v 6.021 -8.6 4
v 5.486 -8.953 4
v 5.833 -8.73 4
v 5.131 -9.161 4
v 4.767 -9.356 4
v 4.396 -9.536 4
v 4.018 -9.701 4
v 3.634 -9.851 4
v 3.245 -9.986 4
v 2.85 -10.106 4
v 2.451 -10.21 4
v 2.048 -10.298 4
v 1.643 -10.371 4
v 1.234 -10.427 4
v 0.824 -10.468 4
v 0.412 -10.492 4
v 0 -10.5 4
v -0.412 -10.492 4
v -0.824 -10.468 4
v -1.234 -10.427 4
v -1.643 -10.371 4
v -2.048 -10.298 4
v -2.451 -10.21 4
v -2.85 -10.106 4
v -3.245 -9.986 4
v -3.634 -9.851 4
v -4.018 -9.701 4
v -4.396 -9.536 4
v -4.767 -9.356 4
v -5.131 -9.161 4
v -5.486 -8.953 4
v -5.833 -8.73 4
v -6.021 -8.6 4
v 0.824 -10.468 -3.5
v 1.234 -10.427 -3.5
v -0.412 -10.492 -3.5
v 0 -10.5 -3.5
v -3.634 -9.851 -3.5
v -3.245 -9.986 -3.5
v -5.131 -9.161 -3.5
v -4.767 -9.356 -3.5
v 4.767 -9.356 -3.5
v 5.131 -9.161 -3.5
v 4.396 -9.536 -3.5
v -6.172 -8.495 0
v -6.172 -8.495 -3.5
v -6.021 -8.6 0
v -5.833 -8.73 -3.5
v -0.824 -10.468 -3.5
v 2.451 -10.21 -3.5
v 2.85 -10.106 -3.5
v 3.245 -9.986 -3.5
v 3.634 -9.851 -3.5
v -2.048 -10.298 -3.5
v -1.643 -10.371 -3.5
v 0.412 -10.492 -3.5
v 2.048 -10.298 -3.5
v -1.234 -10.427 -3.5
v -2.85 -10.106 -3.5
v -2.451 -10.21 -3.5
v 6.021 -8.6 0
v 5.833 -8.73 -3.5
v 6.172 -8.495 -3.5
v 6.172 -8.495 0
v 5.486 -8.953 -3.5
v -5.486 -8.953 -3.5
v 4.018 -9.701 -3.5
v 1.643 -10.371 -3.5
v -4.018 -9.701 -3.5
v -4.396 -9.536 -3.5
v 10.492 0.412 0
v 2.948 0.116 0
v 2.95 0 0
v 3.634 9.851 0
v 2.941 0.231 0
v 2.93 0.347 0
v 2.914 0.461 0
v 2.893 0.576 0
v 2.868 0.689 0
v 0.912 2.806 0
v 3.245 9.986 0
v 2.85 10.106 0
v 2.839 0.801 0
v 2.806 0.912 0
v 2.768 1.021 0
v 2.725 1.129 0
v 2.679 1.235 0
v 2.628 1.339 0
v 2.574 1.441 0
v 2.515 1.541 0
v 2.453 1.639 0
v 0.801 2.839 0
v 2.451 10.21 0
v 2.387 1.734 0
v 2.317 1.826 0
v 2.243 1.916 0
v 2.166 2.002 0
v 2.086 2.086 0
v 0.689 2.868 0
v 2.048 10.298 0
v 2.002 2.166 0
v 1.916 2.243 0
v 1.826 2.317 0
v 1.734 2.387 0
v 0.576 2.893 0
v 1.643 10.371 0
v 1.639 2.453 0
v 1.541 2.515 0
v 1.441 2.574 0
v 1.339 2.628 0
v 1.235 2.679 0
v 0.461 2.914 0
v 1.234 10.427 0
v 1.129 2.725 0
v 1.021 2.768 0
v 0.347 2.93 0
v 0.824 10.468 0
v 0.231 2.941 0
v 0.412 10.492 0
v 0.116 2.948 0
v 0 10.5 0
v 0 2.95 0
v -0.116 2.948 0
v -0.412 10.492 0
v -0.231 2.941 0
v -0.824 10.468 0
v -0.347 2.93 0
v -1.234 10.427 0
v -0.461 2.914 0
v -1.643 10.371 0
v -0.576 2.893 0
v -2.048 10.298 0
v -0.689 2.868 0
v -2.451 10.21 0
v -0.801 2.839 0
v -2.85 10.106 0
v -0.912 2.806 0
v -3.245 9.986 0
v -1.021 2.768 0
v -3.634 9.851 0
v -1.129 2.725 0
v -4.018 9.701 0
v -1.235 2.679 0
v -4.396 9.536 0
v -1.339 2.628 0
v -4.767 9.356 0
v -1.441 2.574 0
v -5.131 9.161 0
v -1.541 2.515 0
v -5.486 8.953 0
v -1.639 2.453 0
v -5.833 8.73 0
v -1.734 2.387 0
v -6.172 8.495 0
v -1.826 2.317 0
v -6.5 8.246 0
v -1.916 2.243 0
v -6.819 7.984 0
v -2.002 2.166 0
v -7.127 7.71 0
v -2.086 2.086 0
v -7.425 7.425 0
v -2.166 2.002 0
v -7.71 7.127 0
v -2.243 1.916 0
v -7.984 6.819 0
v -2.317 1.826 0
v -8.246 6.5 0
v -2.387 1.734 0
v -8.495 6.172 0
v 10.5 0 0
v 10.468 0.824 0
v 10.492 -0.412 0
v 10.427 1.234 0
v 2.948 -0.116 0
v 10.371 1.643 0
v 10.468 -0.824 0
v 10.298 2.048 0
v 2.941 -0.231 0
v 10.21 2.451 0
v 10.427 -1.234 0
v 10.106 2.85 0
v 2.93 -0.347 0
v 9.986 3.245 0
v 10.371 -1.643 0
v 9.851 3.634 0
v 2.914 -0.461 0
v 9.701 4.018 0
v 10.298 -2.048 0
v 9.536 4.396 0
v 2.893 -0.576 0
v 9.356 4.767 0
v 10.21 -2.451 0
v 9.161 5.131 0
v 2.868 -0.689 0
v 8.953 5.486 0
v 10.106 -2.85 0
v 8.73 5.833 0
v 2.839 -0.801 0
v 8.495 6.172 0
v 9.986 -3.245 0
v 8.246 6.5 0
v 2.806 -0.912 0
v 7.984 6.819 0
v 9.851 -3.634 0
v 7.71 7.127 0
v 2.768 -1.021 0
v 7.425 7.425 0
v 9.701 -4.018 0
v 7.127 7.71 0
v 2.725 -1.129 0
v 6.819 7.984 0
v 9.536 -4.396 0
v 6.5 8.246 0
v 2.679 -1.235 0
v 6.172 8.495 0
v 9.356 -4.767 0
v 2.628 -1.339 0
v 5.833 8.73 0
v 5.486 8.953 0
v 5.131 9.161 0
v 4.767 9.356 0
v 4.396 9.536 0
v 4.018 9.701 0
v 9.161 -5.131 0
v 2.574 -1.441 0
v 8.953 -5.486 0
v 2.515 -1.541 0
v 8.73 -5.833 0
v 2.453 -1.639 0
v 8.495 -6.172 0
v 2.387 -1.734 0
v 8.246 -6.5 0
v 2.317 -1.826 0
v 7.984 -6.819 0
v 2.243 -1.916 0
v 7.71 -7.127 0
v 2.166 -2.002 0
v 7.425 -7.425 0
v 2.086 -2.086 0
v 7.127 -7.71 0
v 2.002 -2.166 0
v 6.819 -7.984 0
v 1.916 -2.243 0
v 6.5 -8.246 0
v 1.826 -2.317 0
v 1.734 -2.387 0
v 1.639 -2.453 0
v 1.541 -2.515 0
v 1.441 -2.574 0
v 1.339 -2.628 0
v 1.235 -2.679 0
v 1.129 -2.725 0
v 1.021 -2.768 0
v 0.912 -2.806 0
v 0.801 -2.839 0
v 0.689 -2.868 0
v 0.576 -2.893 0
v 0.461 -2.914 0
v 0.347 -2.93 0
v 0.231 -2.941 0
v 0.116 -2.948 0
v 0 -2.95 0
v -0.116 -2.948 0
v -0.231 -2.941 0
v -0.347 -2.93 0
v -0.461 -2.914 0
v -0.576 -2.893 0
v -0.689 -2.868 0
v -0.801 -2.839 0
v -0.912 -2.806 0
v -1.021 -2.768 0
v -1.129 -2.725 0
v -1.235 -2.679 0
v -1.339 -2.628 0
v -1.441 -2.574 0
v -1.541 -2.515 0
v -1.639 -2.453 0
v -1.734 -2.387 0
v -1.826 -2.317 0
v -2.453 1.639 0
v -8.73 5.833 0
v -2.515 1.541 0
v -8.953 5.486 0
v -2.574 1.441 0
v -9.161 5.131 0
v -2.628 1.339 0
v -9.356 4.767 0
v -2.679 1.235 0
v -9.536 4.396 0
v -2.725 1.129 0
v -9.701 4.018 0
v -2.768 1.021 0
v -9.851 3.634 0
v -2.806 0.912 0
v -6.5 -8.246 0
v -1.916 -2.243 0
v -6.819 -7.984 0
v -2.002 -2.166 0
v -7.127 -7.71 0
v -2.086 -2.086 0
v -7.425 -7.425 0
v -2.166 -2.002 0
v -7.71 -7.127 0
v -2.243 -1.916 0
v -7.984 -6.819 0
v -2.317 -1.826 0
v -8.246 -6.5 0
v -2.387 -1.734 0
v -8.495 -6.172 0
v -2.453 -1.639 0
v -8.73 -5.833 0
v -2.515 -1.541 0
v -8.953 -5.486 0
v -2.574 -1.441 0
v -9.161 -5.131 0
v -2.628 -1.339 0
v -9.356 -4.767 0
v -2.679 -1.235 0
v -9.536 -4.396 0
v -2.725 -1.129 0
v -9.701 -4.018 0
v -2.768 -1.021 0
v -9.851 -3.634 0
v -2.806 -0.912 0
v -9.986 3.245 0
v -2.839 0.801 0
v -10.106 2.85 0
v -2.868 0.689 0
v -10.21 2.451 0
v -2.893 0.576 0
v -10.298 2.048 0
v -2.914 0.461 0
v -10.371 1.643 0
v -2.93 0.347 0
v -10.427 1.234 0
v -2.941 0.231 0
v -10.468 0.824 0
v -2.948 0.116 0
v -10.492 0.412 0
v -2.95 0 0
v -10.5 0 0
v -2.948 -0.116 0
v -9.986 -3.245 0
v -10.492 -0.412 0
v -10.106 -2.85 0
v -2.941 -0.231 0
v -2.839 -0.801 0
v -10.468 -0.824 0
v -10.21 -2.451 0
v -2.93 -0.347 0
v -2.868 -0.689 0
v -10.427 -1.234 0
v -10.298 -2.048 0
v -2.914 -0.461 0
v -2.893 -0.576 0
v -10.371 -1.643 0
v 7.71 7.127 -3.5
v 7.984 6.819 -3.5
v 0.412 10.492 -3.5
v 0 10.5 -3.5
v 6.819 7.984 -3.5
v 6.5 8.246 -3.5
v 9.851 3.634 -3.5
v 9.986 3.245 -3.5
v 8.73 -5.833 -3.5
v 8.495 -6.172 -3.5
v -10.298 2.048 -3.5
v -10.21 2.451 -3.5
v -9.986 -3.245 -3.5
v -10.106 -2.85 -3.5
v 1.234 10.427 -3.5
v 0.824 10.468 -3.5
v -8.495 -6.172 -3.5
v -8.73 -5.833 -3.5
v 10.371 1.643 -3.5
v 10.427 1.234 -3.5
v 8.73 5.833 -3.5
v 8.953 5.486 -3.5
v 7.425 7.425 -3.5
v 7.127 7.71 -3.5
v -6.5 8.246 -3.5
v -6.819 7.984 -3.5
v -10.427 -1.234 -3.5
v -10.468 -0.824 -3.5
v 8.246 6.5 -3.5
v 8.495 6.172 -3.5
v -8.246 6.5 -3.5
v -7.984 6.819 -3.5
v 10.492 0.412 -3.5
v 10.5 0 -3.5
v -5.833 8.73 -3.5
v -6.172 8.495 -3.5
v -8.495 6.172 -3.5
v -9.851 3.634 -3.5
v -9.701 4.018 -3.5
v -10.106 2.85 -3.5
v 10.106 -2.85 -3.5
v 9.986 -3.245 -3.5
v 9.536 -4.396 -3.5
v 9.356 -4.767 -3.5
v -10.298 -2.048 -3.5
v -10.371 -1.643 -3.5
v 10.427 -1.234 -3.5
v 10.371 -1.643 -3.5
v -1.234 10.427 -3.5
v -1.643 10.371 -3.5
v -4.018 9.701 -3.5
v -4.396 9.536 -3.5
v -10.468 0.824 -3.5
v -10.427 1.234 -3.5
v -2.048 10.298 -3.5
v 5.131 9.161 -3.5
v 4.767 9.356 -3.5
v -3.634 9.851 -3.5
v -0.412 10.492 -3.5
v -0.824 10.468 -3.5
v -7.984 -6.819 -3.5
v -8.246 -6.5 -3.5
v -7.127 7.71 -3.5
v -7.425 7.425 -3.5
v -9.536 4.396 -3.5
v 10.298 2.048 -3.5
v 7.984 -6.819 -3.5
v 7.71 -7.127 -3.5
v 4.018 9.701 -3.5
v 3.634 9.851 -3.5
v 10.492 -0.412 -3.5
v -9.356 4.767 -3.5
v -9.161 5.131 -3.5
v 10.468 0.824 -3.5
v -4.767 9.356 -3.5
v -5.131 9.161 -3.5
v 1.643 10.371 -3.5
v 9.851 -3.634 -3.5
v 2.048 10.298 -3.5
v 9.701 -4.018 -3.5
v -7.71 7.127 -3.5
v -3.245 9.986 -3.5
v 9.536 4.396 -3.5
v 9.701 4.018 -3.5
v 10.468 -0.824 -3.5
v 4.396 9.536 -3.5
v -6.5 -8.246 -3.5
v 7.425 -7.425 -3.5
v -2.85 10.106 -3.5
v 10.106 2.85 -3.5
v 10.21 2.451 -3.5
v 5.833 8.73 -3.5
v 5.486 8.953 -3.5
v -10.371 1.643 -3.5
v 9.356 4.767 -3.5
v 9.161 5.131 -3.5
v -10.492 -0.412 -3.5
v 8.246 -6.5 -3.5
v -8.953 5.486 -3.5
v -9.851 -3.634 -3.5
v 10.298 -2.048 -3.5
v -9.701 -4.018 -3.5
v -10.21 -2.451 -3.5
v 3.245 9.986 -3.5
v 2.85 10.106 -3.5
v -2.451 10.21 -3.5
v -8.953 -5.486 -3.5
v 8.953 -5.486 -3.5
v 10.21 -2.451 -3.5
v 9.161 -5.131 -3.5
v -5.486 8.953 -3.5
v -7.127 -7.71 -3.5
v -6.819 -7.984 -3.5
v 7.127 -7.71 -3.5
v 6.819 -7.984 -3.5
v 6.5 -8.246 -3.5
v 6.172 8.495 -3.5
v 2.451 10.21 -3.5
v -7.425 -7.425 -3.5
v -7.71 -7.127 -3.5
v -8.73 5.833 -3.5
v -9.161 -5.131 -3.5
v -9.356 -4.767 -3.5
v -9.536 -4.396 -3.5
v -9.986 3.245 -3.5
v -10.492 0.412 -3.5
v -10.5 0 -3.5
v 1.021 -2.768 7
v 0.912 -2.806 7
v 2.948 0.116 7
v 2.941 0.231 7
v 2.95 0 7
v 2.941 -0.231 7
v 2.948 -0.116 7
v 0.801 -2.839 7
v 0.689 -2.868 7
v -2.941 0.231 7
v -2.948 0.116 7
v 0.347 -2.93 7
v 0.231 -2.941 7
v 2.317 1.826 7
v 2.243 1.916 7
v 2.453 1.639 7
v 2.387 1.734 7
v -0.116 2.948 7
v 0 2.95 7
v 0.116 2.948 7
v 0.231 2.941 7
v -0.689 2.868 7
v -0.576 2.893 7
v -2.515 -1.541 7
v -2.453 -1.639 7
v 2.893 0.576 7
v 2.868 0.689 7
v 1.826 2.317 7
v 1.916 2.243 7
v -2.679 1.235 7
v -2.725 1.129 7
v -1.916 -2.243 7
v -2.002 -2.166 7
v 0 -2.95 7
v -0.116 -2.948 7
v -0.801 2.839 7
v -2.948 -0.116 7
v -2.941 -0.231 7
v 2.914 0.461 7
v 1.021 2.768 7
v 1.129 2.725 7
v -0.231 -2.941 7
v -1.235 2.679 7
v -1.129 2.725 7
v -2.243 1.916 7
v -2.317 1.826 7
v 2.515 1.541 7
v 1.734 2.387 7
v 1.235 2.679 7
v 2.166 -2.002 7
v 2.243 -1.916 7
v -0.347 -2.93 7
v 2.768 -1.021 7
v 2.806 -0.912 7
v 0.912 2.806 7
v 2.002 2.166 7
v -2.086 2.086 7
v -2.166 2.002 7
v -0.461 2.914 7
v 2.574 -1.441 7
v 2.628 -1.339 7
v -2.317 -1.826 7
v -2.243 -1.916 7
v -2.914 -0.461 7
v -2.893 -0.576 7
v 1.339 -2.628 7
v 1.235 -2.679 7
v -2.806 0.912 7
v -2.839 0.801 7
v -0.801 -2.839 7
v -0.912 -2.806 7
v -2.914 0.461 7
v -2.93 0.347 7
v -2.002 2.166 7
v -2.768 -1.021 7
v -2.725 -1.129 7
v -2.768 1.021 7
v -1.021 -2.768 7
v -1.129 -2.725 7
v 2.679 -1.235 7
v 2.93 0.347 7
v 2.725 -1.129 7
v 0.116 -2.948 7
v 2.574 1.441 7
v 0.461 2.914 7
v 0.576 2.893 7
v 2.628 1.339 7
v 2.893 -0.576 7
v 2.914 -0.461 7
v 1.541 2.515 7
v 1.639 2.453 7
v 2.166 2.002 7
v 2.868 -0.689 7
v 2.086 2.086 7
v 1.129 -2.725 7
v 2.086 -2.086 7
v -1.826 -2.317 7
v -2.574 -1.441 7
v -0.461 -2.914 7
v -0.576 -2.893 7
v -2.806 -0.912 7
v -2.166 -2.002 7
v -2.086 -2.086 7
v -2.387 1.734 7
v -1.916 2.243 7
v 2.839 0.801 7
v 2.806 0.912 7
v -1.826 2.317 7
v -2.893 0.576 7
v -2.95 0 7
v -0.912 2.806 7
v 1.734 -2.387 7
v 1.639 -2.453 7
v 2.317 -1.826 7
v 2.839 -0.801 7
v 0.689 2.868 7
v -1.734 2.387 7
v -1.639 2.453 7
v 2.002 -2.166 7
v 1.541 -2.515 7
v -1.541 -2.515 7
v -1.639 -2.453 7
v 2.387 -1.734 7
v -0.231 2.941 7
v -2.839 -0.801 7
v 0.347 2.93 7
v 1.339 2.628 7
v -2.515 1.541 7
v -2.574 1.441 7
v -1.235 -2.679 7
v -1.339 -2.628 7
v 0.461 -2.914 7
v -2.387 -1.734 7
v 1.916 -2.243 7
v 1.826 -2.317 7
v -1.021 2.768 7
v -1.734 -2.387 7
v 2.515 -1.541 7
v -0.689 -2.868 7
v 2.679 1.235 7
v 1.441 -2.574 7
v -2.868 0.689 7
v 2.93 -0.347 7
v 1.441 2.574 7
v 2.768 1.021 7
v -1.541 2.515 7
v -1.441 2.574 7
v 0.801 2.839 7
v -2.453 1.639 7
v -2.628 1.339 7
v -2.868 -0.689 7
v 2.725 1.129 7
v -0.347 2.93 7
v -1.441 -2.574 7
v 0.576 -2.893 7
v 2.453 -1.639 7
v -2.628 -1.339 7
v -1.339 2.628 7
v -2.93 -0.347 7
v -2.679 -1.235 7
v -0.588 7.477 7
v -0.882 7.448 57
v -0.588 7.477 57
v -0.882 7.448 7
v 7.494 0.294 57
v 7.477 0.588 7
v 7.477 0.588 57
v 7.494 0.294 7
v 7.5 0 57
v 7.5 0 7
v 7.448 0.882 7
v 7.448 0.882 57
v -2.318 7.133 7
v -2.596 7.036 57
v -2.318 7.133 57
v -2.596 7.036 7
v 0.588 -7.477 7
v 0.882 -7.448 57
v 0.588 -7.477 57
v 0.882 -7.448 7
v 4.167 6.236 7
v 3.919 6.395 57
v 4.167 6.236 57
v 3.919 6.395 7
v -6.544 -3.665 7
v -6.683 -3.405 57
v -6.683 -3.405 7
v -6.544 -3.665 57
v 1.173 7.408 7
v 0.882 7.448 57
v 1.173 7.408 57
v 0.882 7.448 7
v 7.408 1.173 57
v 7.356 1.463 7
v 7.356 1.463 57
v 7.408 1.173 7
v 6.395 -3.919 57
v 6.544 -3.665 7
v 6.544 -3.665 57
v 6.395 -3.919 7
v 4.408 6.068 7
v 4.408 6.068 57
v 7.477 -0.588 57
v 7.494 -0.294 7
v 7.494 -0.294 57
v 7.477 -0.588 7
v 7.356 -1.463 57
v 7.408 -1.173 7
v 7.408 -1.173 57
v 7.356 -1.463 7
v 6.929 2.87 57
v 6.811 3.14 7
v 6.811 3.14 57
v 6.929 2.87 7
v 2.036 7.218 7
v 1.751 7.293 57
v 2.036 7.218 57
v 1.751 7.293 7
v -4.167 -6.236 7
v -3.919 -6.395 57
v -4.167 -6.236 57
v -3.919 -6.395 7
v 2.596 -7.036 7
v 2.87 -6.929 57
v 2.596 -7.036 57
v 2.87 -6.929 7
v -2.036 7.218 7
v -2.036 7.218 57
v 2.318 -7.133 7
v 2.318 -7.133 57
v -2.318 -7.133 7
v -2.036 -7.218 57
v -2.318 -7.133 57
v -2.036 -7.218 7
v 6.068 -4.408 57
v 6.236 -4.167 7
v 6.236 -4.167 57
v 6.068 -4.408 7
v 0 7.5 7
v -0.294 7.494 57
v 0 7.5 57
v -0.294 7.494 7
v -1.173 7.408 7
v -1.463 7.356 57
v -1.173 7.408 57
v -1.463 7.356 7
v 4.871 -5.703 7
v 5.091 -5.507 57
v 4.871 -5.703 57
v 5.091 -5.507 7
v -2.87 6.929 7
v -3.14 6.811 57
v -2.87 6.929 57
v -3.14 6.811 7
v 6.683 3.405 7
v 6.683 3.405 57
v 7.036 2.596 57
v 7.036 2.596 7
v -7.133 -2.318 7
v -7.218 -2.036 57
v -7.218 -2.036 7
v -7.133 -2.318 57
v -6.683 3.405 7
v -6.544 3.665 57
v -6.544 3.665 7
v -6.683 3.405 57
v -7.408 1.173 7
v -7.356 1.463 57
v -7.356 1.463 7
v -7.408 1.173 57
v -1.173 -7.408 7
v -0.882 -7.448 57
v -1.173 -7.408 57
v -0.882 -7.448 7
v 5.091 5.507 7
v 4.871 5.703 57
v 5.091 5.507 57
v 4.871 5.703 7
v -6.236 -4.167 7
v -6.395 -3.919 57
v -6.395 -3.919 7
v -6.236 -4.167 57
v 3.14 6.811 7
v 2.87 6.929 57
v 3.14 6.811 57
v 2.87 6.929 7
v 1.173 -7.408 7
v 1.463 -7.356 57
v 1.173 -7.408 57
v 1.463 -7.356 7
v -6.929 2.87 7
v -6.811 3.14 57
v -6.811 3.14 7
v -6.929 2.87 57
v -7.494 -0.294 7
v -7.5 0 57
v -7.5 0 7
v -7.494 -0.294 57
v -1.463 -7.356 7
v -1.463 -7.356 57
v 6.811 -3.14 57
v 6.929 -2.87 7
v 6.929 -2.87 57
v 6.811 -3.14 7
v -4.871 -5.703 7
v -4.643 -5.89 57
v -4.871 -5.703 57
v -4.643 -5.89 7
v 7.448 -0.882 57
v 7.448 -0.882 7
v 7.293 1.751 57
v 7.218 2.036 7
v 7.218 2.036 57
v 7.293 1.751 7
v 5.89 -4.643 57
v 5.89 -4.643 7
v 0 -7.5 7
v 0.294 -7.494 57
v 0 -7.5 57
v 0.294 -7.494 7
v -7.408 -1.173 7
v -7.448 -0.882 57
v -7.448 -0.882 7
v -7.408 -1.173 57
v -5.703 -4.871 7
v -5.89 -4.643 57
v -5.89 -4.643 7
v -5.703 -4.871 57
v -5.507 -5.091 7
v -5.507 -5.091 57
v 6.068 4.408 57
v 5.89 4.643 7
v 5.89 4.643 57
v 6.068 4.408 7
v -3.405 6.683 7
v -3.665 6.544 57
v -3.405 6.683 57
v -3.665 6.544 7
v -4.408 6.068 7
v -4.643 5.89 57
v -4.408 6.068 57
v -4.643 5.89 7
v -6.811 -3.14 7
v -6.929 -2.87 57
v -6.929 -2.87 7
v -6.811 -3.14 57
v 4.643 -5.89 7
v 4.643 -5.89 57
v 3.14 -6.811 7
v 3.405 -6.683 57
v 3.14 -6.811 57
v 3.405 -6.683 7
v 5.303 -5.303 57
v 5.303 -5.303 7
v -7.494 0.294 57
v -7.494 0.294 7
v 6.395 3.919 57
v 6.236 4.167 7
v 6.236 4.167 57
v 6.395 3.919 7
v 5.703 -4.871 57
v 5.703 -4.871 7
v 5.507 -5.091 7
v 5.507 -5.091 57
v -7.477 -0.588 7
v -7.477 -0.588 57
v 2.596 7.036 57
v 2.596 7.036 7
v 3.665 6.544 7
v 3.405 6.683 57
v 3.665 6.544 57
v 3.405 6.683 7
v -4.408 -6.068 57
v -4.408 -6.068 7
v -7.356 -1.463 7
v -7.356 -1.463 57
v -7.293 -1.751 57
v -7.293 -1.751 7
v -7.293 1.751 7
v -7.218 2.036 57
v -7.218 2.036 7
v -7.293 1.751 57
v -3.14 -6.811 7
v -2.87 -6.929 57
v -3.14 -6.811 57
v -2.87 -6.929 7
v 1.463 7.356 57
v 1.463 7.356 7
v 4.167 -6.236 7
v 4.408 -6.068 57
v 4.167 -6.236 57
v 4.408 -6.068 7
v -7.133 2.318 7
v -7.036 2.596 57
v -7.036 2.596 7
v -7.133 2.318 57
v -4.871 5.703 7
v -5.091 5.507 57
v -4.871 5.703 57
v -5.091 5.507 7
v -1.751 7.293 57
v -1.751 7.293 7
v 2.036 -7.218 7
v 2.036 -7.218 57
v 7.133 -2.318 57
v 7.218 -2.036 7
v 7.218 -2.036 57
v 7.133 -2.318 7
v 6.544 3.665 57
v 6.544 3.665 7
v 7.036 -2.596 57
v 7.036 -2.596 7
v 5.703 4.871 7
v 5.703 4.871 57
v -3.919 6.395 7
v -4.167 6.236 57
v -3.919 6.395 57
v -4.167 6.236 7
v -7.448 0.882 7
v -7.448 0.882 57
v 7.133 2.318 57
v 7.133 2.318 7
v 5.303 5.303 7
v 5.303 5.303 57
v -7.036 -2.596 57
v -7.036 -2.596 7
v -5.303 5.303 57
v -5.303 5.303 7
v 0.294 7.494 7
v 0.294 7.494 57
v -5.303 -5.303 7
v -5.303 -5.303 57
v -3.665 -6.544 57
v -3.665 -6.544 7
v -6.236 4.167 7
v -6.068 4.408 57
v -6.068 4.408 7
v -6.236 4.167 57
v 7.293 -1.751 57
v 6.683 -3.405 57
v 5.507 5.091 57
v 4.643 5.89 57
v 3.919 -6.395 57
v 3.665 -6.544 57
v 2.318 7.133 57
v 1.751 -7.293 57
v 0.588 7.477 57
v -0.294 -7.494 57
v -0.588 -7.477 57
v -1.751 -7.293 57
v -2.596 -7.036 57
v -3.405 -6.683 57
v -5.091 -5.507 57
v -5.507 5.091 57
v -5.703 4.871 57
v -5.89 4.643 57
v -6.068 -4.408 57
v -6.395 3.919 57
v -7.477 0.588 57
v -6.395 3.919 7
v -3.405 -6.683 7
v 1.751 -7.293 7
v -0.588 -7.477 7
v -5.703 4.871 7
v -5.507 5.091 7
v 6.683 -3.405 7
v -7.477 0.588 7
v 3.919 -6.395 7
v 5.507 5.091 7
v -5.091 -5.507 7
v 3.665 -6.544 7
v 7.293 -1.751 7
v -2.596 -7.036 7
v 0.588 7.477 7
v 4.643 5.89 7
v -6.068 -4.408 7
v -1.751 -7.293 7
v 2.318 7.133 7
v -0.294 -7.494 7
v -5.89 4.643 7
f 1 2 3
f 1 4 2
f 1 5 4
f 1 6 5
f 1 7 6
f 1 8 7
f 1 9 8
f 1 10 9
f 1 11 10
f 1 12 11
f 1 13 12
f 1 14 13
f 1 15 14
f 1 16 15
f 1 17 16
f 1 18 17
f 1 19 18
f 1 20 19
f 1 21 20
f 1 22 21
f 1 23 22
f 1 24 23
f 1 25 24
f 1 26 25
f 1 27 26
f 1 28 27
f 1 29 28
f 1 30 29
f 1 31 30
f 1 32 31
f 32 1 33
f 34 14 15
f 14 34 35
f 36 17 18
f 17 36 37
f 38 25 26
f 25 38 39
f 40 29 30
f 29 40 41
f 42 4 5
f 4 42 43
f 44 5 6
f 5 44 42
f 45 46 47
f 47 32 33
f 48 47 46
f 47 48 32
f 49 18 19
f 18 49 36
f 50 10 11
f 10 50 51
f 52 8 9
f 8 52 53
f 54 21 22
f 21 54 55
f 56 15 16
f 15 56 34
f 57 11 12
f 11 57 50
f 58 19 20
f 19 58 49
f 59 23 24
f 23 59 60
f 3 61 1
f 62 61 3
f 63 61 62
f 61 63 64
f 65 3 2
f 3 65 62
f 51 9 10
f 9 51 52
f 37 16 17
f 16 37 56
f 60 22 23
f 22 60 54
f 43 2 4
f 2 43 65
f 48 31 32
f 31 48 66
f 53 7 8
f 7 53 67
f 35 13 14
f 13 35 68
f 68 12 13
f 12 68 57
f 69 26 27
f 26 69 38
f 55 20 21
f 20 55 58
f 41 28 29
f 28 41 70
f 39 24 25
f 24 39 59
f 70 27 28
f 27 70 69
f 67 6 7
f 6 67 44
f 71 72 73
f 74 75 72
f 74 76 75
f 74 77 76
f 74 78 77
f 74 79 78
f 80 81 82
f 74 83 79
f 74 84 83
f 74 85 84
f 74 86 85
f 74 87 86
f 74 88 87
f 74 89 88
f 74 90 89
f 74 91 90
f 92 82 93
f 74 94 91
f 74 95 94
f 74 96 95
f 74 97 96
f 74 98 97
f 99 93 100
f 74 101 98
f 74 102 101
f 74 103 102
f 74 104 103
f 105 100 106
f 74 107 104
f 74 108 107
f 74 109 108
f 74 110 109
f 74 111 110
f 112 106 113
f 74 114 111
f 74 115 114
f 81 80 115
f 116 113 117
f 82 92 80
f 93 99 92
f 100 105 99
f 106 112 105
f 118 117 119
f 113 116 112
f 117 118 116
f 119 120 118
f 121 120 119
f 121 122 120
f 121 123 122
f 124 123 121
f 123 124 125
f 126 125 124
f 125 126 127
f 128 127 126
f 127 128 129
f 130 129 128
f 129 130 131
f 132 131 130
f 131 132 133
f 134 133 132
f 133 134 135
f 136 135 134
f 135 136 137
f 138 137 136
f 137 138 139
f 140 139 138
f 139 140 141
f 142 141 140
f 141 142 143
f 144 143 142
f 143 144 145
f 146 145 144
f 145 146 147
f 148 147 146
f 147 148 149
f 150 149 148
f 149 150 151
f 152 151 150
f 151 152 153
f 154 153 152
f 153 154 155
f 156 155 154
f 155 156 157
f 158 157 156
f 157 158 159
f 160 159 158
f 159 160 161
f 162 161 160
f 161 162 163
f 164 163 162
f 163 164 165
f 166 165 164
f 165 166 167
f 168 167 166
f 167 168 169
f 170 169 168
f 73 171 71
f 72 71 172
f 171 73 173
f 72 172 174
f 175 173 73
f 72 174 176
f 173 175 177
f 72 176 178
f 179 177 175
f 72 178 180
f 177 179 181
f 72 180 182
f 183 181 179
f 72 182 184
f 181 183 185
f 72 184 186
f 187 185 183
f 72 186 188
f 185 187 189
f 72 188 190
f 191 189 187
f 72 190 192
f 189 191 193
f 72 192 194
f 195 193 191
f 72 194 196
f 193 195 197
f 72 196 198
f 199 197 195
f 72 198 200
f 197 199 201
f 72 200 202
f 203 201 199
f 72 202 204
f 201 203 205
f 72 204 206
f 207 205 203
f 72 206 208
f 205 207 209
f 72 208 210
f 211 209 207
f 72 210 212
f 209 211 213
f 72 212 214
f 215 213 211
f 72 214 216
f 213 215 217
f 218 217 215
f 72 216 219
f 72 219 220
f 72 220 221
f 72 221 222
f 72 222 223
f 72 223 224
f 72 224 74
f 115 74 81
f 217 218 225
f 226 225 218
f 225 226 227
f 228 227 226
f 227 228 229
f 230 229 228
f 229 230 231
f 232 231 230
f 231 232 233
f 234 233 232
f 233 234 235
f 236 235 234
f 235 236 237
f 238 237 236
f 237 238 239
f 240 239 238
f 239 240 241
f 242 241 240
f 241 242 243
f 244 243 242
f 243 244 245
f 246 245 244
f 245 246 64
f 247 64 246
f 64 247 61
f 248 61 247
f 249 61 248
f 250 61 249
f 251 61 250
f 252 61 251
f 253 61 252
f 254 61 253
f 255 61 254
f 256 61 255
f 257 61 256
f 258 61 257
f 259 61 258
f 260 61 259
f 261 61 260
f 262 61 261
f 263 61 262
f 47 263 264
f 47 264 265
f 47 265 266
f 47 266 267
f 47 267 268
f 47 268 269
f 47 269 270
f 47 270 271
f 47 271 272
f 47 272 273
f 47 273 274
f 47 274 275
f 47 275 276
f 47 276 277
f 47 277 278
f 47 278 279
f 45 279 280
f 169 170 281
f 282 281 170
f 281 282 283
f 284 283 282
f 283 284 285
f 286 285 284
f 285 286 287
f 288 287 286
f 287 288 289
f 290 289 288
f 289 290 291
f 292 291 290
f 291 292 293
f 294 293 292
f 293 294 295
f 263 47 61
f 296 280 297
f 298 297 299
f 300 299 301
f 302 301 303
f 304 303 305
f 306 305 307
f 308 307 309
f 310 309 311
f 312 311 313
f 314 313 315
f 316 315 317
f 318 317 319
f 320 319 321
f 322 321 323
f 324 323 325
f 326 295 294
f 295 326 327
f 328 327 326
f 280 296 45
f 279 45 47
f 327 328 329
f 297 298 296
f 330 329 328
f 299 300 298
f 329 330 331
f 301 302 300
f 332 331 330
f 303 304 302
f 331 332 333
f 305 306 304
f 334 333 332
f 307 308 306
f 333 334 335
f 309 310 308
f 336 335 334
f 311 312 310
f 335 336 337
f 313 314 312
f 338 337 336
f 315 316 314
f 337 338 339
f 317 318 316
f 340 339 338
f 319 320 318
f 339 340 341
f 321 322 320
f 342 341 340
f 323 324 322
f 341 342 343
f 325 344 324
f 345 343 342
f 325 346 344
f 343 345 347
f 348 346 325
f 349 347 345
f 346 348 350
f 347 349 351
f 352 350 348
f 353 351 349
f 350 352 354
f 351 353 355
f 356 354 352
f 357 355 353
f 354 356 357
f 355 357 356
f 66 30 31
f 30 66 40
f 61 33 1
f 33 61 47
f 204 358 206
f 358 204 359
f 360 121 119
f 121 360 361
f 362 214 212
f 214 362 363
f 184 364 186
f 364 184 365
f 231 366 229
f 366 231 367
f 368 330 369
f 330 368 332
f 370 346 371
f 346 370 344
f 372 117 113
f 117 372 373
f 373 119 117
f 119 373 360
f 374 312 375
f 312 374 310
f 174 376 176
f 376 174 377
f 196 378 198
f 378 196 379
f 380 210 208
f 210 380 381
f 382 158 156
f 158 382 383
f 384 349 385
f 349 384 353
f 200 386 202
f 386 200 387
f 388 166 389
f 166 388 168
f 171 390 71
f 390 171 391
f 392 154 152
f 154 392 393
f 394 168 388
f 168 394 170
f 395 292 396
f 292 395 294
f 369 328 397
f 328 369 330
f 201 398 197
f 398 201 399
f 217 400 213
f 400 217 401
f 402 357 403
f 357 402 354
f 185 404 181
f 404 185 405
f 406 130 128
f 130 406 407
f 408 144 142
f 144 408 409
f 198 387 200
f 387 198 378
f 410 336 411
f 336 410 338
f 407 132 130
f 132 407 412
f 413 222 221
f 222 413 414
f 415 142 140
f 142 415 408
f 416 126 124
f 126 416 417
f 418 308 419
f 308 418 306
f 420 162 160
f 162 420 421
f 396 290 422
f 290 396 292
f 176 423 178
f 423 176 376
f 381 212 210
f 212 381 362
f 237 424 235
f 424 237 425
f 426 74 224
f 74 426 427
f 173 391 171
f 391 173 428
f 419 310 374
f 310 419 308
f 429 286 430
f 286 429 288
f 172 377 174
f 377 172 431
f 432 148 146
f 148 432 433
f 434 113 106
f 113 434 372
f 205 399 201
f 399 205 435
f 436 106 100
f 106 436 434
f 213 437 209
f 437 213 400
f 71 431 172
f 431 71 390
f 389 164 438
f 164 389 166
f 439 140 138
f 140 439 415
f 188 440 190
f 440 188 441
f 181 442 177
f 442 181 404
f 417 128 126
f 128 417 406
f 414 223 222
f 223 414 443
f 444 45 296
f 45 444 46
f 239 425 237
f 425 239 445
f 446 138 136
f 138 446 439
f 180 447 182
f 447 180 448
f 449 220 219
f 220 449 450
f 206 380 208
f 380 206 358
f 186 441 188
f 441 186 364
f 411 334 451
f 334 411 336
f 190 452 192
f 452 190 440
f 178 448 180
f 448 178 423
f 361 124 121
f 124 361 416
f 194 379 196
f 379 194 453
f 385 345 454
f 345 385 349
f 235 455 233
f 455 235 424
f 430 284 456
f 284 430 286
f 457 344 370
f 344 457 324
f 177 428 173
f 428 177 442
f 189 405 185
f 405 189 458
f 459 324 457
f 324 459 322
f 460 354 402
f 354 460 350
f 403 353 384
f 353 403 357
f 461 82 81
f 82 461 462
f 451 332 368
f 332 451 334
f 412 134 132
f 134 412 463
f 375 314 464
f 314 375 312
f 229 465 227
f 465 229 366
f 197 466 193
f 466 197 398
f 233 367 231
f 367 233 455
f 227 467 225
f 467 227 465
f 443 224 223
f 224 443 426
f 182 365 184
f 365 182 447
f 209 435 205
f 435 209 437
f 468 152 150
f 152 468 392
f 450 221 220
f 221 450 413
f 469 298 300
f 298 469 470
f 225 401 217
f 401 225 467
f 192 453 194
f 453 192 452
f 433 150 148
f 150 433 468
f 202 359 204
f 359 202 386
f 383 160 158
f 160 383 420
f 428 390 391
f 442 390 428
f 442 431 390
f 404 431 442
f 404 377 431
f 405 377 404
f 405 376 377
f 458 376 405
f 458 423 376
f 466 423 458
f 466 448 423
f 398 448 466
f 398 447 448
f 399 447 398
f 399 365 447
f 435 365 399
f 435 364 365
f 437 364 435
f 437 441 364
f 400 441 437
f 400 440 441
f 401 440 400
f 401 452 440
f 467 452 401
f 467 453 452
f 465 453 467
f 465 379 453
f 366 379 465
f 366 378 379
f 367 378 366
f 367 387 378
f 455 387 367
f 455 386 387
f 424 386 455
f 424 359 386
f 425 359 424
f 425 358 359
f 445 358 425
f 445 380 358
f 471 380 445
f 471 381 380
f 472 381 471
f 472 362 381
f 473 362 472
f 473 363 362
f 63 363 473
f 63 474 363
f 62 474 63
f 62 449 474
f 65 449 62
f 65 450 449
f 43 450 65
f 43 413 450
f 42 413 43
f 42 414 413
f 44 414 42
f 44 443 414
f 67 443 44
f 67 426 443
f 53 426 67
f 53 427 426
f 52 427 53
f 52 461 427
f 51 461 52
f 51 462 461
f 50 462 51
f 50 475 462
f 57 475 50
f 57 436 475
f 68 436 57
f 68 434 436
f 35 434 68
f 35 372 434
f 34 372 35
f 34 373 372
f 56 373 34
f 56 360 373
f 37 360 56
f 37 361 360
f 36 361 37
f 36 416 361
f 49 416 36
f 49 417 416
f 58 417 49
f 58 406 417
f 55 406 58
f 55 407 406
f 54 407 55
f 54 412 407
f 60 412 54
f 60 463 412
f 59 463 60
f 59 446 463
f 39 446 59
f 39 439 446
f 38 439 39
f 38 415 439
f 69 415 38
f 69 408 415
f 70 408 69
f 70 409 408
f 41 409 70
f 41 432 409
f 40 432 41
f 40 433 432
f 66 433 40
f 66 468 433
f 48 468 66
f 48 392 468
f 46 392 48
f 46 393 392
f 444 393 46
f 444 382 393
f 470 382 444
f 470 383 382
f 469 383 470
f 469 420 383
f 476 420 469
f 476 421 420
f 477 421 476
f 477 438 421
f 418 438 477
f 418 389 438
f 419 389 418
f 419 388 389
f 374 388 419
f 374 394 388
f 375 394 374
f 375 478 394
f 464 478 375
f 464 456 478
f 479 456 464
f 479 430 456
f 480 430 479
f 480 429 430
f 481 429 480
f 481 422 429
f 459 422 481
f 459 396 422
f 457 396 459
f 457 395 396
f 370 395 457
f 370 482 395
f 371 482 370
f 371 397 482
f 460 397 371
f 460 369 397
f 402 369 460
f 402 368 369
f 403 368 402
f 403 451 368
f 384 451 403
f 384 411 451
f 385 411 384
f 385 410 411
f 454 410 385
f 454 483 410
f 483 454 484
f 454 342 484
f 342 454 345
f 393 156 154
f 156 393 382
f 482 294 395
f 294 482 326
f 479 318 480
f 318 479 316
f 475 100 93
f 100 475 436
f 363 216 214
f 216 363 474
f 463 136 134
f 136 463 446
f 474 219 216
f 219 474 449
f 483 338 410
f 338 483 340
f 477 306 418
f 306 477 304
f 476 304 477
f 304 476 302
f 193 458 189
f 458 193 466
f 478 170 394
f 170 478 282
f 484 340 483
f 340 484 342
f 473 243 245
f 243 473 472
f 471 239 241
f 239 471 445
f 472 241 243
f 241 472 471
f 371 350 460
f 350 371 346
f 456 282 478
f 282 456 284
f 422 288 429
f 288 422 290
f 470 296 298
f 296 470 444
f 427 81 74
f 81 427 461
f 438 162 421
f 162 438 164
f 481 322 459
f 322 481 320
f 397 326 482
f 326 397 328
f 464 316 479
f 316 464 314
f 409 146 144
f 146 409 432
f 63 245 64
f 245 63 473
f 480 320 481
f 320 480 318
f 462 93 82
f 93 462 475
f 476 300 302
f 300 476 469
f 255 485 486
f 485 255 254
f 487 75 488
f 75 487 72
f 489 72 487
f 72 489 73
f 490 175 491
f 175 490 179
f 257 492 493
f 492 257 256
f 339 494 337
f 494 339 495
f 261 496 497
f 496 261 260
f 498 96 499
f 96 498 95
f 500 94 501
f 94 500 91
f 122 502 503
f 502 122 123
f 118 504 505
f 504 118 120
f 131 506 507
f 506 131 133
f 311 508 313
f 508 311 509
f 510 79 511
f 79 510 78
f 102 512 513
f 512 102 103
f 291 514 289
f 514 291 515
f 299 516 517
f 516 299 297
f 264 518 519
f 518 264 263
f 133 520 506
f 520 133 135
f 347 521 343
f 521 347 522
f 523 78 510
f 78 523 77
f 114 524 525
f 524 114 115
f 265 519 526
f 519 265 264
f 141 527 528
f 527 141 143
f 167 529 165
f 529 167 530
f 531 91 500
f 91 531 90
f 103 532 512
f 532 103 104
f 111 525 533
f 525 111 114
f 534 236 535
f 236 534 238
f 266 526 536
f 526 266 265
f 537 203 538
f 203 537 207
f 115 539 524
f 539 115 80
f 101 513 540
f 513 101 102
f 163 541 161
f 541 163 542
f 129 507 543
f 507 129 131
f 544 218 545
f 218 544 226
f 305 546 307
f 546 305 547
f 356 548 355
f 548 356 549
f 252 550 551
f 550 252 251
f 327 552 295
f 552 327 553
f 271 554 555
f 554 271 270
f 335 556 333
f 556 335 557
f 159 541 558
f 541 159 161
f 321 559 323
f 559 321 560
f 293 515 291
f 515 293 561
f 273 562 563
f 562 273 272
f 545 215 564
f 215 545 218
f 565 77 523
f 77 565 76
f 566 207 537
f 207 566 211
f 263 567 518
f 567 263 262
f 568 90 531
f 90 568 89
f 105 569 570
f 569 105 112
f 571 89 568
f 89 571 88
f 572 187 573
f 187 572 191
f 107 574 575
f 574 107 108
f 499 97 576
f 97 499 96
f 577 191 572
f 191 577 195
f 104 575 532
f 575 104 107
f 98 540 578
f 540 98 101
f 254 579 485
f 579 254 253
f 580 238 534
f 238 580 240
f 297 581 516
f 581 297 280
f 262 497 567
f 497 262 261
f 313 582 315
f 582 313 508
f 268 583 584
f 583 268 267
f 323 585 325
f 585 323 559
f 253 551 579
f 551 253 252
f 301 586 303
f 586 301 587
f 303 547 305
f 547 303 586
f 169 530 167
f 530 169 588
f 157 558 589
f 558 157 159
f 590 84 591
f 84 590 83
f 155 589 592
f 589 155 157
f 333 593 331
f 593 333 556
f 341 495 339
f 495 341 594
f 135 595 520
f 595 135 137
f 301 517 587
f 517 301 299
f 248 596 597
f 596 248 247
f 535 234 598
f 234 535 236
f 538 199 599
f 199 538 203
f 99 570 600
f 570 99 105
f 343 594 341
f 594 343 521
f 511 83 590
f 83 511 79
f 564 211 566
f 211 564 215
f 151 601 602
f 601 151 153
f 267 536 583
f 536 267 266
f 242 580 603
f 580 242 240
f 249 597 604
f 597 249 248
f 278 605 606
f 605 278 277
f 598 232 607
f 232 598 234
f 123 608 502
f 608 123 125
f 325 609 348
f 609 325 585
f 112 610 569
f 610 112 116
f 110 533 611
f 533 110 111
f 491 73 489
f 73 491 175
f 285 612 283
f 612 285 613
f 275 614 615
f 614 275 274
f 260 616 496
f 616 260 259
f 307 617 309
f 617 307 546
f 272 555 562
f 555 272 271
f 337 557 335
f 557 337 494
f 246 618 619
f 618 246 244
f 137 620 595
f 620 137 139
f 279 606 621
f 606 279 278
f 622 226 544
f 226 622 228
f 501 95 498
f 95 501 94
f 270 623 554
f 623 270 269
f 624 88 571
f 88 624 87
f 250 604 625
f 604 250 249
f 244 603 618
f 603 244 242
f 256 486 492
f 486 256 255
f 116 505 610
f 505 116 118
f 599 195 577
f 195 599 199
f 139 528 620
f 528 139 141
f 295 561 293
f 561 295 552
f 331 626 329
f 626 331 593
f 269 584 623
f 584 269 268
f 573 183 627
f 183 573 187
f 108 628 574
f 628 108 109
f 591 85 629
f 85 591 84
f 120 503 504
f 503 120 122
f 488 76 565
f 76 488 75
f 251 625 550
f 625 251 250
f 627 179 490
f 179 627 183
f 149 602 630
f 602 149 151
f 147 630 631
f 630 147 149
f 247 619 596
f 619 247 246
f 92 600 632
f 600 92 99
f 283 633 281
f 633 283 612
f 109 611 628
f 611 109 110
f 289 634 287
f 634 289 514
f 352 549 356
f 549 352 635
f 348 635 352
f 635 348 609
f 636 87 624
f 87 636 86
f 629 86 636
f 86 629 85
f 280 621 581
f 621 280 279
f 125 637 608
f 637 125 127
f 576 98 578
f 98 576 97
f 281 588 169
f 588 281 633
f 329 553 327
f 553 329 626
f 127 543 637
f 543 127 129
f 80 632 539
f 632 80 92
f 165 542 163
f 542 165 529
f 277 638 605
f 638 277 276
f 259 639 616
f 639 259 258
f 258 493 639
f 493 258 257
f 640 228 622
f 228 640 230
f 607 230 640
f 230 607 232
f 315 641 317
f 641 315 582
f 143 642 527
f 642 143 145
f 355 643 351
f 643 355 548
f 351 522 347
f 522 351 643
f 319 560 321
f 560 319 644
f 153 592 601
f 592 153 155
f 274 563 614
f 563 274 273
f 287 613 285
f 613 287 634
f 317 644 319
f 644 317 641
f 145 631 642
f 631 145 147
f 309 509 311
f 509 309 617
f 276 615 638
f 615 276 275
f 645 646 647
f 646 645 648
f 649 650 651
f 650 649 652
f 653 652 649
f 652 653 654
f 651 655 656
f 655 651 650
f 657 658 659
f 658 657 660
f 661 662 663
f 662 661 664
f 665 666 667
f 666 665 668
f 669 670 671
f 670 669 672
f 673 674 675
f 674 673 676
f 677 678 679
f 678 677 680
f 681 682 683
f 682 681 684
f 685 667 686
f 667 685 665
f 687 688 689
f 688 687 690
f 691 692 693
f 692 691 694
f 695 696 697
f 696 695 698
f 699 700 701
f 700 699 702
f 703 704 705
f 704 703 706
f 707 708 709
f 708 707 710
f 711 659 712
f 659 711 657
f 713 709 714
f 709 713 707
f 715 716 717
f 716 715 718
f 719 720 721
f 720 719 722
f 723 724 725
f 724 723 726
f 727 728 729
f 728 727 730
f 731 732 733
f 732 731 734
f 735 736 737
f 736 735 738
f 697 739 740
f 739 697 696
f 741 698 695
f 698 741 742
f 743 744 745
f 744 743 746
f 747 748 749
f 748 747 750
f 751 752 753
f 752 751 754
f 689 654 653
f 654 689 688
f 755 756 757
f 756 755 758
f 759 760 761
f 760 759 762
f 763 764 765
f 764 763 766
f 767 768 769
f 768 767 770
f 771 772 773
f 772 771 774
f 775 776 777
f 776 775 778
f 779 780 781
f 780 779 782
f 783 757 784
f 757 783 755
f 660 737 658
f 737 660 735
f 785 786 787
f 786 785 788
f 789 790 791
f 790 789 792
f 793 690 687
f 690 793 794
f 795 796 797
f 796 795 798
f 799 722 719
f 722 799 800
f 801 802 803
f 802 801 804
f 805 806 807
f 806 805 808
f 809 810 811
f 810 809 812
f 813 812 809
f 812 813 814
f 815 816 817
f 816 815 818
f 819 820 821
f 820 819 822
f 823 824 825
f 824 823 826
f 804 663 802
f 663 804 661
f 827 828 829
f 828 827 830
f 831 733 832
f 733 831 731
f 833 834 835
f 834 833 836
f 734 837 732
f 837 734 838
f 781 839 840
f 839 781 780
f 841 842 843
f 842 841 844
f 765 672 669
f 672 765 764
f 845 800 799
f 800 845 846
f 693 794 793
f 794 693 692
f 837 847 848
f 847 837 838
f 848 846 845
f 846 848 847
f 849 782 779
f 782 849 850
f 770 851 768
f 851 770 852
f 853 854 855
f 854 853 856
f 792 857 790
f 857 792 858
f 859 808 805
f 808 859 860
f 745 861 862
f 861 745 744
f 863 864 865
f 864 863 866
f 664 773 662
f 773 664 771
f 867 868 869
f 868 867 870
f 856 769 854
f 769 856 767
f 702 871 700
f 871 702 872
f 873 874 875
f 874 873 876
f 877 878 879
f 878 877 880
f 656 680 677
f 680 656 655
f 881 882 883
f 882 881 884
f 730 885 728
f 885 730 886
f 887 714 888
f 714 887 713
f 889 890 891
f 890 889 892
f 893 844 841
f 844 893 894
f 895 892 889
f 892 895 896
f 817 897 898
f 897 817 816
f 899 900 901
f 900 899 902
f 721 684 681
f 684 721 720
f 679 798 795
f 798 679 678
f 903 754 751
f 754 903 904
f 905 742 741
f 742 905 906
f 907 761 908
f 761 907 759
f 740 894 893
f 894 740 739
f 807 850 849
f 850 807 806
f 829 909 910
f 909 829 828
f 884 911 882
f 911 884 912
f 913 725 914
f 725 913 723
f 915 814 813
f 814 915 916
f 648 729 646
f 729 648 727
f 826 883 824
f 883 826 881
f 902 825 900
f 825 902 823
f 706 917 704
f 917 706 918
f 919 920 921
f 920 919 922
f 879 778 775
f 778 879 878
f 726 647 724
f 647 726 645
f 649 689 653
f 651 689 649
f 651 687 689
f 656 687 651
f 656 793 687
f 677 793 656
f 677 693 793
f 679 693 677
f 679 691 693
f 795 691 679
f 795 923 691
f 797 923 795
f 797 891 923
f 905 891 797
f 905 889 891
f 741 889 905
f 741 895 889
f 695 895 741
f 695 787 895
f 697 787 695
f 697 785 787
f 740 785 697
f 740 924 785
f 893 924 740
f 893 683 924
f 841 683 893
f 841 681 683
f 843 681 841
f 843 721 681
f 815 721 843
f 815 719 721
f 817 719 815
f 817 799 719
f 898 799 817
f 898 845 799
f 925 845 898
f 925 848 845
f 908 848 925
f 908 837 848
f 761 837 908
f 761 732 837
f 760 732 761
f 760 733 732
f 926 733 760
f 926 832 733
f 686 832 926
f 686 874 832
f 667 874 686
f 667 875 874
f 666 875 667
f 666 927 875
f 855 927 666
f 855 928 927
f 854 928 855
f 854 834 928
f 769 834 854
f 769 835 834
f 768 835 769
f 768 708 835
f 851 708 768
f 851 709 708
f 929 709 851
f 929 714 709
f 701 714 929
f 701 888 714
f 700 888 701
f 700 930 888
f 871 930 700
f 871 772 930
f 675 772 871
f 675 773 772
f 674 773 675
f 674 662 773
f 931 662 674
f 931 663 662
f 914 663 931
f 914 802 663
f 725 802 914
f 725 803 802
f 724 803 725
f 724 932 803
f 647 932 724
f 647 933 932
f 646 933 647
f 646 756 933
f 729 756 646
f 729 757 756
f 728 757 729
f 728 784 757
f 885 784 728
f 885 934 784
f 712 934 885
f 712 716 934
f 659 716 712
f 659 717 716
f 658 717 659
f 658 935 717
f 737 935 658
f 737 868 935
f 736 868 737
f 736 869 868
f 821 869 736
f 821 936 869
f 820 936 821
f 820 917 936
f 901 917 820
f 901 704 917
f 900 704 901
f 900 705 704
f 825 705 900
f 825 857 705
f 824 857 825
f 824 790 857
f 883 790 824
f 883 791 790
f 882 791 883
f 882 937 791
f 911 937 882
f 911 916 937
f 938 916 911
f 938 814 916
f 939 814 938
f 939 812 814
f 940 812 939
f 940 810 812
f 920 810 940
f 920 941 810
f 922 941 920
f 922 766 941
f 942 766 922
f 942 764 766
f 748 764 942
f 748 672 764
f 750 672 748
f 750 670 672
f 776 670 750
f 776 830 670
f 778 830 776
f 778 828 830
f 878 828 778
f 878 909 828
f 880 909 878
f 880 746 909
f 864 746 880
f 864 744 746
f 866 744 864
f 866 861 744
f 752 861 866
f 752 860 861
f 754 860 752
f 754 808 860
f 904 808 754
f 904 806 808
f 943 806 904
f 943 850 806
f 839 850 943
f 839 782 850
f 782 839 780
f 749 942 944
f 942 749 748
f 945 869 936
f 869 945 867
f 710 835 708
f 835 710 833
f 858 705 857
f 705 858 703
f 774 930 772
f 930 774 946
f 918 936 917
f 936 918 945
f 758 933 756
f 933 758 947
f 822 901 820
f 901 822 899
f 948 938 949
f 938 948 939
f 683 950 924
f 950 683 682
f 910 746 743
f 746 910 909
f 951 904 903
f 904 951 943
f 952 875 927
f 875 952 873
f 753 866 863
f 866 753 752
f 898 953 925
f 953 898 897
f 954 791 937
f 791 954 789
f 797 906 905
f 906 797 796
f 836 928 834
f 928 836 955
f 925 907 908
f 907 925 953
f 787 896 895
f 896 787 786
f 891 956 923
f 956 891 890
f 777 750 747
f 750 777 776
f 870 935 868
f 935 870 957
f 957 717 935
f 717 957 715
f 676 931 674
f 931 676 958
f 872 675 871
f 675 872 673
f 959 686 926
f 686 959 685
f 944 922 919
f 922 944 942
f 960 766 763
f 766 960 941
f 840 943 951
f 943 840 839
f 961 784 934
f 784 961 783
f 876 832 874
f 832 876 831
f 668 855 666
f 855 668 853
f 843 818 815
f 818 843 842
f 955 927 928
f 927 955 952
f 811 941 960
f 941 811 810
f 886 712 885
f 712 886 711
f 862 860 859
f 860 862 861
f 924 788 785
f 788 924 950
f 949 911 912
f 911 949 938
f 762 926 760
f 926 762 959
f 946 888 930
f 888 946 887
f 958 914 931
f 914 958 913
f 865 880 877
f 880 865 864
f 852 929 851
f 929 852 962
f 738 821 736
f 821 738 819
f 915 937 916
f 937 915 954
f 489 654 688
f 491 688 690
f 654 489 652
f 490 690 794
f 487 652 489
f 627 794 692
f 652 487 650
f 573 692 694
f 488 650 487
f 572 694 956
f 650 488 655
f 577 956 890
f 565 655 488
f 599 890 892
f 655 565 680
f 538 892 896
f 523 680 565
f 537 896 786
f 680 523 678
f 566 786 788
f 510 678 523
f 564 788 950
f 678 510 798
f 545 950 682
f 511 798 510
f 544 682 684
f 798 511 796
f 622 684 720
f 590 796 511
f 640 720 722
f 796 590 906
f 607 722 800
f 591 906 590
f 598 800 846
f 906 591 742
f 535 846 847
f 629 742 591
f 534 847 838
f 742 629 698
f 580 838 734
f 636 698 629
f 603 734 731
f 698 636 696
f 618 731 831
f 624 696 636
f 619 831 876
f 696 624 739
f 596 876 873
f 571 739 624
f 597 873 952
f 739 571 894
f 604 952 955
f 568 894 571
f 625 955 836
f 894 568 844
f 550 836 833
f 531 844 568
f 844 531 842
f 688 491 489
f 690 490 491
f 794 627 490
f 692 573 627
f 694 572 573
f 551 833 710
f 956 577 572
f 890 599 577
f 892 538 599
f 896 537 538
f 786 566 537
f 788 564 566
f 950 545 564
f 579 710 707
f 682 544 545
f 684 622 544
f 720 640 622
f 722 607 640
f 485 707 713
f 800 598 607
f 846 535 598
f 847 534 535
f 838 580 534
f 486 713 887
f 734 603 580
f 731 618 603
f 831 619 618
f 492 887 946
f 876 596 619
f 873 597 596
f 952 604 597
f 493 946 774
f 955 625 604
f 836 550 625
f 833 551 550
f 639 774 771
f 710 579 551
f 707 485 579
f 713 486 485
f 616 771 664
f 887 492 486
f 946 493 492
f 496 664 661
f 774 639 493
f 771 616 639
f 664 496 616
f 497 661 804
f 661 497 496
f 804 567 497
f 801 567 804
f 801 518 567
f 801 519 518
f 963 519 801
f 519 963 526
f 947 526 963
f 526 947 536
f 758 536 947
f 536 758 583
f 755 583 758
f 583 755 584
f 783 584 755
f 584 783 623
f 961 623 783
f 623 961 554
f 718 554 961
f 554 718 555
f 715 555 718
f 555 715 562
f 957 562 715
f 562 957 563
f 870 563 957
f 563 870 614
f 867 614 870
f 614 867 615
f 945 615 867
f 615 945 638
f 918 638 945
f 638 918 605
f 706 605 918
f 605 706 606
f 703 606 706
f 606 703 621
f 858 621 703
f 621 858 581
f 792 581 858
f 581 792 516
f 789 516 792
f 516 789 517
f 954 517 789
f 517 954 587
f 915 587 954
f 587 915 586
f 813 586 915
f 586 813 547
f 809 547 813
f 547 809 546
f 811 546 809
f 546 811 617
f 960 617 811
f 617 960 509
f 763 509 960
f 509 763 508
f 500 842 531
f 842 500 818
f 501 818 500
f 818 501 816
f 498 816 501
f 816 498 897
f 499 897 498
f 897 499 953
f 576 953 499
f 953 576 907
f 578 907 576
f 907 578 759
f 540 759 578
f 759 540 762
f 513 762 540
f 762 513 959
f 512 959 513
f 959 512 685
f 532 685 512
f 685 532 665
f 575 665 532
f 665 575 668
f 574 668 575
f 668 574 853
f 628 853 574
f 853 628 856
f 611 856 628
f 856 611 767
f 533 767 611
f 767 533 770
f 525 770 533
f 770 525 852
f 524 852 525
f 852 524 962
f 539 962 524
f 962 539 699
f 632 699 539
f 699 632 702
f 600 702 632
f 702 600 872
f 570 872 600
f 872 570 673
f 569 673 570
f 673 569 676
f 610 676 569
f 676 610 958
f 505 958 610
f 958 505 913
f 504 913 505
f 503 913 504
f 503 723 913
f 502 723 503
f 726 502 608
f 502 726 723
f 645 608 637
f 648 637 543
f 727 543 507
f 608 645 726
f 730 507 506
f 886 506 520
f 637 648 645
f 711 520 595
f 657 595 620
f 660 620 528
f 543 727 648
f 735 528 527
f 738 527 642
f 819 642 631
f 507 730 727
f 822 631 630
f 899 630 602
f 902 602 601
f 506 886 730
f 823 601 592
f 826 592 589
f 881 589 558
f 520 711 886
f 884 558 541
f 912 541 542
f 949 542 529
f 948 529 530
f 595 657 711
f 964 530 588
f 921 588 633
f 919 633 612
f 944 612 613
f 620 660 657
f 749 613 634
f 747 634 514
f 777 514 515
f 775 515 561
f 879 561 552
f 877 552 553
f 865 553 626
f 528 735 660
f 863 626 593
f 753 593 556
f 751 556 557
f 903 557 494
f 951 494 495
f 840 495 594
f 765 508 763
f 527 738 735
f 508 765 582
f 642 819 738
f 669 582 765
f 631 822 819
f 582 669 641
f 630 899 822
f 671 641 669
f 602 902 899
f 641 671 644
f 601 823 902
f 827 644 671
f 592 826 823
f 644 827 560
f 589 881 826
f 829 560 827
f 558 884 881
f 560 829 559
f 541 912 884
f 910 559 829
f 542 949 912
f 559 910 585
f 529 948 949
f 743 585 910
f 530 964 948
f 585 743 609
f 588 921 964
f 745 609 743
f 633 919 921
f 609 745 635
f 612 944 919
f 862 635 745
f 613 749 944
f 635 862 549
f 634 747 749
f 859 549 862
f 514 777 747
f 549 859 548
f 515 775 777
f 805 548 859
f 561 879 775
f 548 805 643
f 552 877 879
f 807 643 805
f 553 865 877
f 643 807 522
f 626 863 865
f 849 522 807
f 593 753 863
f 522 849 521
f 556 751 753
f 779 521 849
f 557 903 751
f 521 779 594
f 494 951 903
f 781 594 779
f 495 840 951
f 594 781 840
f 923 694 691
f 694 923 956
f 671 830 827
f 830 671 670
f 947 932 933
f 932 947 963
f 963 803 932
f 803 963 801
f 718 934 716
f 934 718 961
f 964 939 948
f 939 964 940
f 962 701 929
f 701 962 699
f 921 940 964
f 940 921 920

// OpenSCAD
$fn=160;

module metal() {
    translate([0,0,0])    cylinder(d=21,h=3.5);
    translate([0,0,3.5])  cylinder(d=5.90,h=8);
    translate([0,0,3.5+7])cylinder(d=15,h=50);

    translate([0,0,3.5])difference() {
        cylinder(d=21,h=4);
        translate([-20,-8.6,0])cube([40,20,4]);
    }
}

translate([0,0,-3.5])#metal();
